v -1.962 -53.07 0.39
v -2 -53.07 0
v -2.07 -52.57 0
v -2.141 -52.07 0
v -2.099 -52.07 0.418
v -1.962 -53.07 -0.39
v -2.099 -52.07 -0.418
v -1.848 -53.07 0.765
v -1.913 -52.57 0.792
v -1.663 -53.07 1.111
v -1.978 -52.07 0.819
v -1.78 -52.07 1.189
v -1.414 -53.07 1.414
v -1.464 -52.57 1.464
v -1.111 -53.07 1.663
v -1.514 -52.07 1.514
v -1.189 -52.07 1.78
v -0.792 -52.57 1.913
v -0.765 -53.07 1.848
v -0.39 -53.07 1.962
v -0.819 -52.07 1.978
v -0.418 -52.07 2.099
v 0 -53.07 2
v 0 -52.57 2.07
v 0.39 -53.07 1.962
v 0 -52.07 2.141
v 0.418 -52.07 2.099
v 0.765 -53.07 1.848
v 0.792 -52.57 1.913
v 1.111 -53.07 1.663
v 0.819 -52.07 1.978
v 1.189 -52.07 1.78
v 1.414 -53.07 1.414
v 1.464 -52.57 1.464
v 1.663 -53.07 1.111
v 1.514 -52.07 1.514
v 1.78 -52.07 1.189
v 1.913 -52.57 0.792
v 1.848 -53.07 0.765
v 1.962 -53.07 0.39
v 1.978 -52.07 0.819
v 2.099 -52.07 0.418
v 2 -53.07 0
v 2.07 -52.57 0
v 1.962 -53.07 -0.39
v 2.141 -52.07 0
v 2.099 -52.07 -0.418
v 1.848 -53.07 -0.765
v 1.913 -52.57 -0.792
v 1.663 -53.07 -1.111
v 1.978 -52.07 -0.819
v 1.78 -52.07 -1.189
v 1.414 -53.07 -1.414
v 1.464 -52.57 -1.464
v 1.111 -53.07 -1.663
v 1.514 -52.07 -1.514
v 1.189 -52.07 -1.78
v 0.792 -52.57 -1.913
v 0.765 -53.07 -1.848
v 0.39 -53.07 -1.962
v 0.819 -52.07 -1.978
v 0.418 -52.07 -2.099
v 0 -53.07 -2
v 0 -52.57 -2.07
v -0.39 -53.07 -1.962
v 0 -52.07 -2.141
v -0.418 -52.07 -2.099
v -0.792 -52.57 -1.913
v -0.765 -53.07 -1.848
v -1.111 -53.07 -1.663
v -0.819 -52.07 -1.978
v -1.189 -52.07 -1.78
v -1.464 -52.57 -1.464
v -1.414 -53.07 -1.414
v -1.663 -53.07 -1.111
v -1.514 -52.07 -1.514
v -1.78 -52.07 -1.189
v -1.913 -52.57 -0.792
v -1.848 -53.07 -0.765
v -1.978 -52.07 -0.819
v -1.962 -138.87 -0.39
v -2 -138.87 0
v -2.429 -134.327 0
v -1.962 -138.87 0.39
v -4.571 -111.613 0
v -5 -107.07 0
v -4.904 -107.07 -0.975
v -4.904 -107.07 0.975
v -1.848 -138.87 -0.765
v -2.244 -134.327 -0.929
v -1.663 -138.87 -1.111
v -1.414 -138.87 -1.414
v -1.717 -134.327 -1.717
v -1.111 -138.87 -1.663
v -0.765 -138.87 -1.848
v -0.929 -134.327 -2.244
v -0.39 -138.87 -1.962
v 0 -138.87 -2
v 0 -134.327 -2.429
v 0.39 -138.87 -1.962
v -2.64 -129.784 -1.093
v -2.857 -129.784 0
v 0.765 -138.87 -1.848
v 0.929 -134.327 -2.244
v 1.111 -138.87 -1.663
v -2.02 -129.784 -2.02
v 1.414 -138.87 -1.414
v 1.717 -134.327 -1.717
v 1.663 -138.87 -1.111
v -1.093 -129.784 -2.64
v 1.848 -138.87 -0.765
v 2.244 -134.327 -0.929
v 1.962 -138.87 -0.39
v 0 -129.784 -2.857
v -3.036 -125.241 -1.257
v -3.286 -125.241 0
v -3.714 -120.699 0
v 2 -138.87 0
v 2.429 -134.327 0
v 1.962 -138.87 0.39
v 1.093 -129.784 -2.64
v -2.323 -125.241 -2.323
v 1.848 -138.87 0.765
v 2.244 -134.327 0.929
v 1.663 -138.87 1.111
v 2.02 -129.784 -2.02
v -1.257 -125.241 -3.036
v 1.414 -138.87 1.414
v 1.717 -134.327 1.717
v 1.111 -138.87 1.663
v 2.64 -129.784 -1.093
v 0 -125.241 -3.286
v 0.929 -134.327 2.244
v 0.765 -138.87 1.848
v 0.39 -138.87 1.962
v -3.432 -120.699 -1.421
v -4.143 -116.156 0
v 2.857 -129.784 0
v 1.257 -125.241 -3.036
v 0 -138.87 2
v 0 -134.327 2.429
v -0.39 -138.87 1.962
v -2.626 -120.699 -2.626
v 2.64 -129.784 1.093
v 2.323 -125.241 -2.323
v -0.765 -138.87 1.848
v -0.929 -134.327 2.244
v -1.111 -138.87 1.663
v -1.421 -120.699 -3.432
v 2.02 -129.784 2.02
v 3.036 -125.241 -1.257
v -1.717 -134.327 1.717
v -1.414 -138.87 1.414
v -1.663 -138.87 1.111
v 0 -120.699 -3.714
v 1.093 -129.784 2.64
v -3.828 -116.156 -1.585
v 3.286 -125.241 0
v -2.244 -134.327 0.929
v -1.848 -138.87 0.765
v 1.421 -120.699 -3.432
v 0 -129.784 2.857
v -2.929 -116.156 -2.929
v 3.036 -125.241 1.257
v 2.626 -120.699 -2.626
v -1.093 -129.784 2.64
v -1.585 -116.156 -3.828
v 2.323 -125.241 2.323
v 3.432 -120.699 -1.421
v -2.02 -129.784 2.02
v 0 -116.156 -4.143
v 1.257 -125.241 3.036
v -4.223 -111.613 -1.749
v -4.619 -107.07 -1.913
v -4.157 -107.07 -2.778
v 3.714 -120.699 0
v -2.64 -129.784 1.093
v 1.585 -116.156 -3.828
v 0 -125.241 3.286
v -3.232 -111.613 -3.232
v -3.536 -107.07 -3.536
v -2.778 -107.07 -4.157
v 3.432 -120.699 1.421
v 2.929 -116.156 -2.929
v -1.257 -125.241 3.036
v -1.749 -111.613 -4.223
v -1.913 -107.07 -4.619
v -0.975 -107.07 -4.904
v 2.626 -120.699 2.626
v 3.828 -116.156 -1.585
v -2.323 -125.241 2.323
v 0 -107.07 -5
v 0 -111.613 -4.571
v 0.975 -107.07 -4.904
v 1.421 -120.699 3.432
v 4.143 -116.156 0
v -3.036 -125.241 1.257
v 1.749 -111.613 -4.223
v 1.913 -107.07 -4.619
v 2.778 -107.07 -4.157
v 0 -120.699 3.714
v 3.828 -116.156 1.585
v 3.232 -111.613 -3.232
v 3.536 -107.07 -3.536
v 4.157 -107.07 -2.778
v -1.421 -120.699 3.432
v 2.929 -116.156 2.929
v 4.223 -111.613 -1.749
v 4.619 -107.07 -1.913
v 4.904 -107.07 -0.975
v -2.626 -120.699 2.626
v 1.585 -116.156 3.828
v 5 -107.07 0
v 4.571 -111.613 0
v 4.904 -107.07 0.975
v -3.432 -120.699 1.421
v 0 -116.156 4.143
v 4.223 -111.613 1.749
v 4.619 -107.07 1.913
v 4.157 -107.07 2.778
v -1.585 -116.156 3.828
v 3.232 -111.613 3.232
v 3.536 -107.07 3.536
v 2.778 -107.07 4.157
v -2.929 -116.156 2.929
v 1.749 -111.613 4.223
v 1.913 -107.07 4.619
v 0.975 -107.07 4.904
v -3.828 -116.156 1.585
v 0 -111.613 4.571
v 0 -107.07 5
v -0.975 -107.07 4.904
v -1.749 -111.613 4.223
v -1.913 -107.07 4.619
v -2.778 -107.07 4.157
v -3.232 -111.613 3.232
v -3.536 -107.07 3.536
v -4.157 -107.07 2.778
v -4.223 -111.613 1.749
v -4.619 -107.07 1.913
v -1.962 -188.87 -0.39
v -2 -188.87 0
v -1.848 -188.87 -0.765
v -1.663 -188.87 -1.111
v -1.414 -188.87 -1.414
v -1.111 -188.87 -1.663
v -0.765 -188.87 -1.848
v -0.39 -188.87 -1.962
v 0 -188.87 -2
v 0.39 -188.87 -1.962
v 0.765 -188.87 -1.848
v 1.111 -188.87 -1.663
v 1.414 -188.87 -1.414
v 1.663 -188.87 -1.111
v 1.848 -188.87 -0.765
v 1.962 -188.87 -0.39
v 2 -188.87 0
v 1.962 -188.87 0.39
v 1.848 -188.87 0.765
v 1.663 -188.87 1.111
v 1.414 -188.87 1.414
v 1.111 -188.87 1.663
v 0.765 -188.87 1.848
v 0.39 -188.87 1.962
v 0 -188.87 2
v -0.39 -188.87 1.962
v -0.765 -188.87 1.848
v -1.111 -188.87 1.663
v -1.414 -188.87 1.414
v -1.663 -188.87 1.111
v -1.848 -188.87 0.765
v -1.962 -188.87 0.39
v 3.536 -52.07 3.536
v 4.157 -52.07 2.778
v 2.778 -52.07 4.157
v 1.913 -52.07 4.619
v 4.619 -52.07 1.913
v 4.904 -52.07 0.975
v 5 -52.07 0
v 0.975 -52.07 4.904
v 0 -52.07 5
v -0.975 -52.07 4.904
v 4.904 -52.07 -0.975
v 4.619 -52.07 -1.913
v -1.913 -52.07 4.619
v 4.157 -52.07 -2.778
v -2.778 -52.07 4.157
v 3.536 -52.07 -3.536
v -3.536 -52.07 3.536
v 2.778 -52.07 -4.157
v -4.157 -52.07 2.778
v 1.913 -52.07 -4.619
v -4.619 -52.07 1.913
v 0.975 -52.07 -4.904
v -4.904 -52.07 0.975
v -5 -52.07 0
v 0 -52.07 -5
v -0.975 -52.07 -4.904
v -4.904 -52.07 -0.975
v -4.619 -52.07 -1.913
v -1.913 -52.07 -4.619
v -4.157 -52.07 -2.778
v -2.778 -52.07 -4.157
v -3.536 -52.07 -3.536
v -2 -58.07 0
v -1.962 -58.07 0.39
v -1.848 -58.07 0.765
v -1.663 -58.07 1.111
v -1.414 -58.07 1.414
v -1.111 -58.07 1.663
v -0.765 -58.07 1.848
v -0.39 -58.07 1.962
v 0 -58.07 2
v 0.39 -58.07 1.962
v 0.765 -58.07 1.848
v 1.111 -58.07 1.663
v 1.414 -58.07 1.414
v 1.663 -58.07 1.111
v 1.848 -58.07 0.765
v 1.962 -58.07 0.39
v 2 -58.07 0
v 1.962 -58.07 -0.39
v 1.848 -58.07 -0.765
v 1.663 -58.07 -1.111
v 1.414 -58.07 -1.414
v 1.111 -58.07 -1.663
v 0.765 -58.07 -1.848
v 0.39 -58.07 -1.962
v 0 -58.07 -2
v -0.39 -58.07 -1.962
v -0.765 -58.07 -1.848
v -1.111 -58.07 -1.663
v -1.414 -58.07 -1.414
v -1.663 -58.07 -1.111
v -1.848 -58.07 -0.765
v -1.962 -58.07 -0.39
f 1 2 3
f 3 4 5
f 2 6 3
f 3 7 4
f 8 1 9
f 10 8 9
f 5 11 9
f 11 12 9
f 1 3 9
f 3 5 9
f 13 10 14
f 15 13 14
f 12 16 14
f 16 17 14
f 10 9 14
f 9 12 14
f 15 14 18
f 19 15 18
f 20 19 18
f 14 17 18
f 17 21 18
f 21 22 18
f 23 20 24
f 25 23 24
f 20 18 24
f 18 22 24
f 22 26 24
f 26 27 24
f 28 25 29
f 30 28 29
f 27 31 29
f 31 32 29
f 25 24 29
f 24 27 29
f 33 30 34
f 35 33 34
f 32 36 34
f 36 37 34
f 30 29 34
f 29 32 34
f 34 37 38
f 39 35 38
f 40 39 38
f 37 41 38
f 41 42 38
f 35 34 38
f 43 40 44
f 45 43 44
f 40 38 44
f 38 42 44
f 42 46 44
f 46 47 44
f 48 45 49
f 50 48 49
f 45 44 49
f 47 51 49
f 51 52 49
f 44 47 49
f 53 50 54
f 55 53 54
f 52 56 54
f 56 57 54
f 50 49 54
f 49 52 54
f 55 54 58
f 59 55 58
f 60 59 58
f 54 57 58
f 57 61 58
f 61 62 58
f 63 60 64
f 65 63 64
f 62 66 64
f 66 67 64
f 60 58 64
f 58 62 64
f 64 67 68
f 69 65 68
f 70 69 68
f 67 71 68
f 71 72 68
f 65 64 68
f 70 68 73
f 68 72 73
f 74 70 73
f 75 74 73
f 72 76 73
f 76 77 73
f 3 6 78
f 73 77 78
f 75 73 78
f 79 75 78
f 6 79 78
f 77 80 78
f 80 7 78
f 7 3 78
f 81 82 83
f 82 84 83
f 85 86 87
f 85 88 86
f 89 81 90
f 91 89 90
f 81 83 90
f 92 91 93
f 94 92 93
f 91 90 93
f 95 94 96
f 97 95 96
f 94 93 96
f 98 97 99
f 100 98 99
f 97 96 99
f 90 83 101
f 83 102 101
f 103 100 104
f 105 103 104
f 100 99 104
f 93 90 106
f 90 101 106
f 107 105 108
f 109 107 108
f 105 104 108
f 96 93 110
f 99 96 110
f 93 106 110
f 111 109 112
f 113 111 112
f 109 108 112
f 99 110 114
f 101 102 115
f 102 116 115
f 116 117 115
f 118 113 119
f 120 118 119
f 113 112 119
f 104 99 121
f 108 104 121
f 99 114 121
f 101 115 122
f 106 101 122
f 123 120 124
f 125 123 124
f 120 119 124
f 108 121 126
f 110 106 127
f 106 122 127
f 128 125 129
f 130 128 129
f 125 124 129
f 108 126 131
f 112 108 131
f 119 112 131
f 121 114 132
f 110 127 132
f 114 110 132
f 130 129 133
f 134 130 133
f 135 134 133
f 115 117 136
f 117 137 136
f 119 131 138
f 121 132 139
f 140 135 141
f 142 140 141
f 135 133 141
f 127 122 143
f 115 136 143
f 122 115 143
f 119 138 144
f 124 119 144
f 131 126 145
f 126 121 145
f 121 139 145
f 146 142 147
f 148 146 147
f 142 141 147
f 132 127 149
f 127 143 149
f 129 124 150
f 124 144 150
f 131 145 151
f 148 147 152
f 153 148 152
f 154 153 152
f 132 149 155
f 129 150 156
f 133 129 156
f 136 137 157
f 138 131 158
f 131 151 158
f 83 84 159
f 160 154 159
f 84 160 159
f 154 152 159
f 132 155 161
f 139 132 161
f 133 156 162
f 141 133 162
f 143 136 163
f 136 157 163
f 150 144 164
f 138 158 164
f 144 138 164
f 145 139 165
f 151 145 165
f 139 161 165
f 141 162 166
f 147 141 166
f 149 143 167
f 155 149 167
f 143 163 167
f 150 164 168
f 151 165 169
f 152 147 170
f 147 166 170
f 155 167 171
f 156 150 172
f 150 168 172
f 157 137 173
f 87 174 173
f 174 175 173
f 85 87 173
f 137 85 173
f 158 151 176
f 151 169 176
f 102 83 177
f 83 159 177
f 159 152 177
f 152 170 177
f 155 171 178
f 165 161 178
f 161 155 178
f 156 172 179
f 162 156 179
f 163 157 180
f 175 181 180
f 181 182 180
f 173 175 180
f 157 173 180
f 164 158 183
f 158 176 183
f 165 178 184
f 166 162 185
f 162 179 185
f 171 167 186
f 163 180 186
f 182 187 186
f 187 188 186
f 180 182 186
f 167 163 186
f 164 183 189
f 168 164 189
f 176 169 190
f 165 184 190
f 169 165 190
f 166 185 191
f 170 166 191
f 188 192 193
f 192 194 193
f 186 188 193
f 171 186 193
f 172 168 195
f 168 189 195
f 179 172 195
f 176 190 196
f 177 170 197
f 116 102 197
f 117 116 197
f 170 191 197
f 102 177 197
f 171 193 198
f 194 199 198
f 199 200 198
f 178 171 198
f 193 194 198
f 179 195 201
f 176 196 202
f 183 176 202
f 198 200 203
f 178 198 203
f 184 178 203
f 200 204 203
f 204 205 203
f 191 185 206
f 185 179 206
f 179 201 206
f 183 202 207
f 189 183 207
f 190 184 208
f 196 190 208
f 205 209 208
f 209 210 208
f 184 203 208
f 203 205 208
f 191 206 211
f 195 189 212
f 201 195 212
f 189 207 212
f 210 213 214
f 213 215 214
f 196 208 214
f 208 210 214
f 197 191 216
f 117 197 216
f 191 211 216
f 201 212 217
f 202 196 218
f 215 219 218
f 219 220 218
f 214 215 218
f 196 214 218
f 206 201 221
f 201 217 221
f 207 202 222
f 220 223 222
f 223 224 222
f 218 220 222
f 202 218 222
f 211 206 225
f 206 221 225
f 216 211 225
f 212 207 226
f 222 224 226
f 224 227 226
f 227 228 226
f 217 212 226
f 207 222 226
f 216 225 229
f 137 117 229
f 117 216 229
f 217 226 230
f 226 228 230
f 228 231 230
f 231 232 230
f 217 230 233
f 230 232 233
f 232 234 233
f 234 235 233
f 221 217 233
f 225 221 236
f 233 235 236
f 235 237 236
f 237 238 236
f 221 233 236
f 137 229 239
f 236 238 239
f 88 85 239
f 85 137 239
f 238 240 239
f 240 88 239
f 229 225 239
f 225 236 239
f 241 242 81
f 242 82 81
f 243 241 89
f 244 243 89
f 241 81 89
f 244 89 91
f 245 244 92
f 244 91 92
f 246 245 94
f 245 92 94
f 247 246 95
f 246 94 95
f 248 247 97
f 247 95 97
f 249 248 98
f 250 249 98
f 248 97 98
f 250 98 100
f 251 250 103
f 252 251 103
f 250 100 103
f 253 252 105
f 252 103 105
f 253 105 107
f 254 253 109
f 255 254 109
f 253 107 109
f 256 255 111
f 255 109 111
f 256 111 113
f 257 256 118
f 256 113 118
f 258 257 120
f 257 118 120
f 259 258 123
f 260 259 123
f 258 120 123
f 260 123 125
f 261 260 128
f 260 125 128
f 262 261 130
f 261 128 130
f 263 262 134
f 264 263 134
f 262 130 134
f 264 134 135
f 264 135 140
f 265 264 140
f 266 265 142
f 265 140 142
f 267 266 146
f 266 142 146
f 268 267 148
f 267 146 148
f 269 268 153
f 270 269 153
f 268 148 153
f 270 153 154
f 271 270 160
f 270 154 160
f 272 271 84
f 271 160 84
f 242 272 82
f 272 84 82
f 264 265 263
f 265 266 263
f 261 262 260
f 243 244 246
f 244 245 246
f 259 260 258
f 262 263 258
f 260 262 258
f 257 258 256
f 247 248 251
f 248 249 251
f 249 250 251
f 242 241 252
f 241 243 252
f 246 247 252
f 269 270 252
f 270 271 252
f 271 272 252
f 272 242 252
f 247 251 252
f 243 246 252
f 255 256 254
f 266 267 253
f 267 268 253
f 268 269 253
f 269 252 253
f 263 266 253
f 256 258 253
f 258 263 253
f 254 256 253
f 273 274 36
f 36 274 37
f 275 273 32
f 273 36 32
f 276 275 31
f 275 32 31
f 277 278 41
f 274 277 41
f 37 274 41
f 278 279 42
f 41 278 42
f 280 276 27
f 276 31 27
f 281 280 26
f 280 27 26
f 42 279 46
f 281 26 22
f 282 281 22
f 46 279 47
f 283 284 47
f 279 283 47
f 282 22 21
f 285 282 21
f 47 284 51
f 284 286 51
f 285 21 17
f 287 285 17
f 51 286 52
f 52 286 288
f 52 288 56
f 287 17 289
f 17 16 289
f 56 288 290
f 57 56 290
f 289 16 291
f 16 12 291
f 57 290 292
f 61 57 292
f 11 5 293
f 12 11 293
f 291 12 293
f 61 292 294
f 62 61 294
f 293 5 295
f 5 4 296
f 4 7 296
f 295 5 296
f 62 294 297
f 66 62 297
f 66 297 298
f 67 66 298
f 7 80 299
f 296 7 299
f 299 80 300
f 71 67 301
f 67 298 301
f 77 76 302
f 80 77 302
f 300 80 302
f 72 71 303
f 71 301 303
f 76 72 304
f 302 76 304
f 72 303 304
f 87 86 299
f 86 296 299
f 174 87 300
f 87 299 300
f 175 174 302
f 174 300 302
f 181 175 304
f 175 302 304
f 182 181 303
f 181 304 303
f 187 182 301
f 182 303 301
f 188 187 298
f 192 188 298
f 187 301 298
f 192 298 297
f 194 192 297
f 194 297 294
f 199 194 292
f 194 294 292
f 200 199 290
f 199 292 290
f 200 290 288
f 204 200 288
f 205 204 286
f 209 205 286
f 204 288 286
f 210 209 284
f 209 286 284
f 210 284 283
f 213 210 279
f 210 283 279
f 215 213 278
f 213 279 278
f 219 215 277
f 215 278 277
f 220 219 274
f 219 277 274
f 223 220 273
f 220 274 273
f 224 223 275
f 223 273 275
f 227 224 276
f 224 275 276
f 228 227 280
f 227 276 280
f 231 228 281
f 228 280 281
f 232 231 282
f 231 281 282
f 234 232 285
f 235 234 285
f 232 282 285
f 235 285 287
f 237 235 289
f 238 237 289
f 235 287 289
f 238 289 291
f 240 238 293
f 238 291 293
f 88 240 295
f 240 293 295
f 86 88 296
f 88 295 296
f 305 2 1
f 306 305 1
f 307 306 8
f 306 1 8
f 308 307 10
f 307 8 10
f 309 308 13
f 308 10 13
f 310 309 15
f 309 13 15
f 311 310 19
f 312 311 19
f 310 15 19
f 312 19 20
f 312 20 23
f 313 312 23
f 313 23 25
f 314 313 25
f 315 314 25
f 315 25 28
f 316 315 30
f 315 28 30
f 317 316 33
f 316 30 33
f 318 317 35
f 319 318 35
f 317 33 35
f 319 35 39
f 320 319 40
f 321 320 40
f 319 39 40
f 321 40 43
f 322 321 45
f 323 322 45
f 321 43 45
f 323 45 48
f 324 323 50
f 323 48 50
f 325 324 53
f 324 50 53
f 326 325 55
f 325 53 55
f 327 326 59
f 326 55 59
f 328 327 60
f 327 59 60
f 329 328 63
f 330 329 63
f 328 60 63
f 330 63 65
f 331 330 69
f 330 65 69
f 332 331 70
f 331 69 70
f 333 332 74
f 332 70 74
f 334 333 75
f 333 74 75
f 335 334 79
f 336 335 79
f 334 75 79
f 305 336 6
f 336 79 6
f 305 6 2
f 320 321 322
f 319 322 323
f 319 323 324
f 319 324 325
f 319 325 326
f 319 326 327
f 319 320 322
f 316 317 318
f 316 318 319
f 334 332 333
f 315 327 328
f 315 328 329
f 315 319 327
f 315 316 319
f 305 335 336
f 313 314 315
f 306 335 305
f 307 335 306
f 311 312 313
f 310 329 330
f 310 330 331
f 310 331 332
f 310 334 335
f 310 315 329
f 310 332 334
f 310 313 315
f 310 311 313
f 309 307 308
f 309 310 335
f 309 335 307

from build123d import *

# Parameters (mm, degrees)
SKETCH3_R          = 2.8067
CUT_EXTRUDE1_DEPTH = 12
CHAMFER1_SIZE      = 0.4
CHAMFER1_SIZE2     = 1.098990968
SKETCH4_R          = 2
CUT_EXTRUDE2_DEPTH = 6
CHAMFER2_SIZE      = 1
CHAMFER2_SIZE2     = 0.140540835


with BuildPart() as part:
    # Sketch1 → Revolve1 (revolve)
    with BuildSketch(Plane.XY, mode=Mode.PRIVATE) as revolve1_sk:
        Polygon((0, 95.25), (15.875, 95.25), (15.875, 0), (6.352863958, 0), (6.352863958, -38.836595706), (7.9248, -44.181178248), (7.9248, -52.07), (0, -52.07), align=None)
    revolve(revolve1_sk.sketch.rotate(Axis((0, 95.25, 0), (0, -1, 0)), 180), axis=Axis((0, 95.25, 0), (0, -1, 0)))

    # Sketch3 → Cut-Extrude1 (cut)
    with BuildSketch(Plane.XZ.offset(52.07)):
        Circle(SKETCH3_R)
    extrude(amount=-CUT_EXTRUDE1_DEPTH, mode=Mode.SUBTRACT)

    # Chamfer1
    chamfer1_edges = [part.edges().sort_by_distance(p)[0] for p in [
        (-2.8067, -52.07, 0),
    ]]
    chamfer1_side = [part.faces().sort_by_distance(p)[0] for p in [
        (7.700652807, -52.07, 0),
    ]]
    chamfer(chamfer1_edges, length=CHAMFER1_SIZE, length2=CHAMFER1_SIZE2, reference=chamfer1_side[0])


with BuildPart() as body_2:
    # Sketch2 → Revolve2 (revolve)
    with BuildSketch(Plane.XY, mode=Mode.PRIVATE) as revolve2_sk:
        Polygon((0, -52.07), (0, -188.87), (2, -188.87), (2, -138.87), (5, -107.07), (5, -52.07), align=None)
    revolve(revolve2_sk.sketch.rotate(Axis((0, -52.07, 0), (0, -1, 0)), 180), axis=Axis((0, -52.07, 0), (0, -1, 0)))

    # Sketch4 → Cut-Extrude2 (cut)
    with BuildSketch(Plane(origin=(0, -52.07, 0), x_dir=(1, 0, 0), z_dir=(0, 1, 0))):
        with Locations(Location((0, 0, 0), (0, 0, 180))):
            Circle(SKETCH4_R)
    extrude(amount=-CUT_EXTRUDE2_DEPTH, mode=Mode.SUBTRACT)

    # Chamfer2
    chamfer2_edges = [body_2.edges().sort_by_distance(p)[0] for p in [
        (2, -52.07, 0),
    ]]
    chamfer2_side = [body_2.faces().sort_by_distance(p)[0] for p in [
        (2, -55.07, 0),
    ]]
    chamfer(chamfer2_edges, length=CHAMFER2_SIZE, length2=CHAMFER2_SIZE2, reference=chamfer2_side[0])


solid = body_2.part
